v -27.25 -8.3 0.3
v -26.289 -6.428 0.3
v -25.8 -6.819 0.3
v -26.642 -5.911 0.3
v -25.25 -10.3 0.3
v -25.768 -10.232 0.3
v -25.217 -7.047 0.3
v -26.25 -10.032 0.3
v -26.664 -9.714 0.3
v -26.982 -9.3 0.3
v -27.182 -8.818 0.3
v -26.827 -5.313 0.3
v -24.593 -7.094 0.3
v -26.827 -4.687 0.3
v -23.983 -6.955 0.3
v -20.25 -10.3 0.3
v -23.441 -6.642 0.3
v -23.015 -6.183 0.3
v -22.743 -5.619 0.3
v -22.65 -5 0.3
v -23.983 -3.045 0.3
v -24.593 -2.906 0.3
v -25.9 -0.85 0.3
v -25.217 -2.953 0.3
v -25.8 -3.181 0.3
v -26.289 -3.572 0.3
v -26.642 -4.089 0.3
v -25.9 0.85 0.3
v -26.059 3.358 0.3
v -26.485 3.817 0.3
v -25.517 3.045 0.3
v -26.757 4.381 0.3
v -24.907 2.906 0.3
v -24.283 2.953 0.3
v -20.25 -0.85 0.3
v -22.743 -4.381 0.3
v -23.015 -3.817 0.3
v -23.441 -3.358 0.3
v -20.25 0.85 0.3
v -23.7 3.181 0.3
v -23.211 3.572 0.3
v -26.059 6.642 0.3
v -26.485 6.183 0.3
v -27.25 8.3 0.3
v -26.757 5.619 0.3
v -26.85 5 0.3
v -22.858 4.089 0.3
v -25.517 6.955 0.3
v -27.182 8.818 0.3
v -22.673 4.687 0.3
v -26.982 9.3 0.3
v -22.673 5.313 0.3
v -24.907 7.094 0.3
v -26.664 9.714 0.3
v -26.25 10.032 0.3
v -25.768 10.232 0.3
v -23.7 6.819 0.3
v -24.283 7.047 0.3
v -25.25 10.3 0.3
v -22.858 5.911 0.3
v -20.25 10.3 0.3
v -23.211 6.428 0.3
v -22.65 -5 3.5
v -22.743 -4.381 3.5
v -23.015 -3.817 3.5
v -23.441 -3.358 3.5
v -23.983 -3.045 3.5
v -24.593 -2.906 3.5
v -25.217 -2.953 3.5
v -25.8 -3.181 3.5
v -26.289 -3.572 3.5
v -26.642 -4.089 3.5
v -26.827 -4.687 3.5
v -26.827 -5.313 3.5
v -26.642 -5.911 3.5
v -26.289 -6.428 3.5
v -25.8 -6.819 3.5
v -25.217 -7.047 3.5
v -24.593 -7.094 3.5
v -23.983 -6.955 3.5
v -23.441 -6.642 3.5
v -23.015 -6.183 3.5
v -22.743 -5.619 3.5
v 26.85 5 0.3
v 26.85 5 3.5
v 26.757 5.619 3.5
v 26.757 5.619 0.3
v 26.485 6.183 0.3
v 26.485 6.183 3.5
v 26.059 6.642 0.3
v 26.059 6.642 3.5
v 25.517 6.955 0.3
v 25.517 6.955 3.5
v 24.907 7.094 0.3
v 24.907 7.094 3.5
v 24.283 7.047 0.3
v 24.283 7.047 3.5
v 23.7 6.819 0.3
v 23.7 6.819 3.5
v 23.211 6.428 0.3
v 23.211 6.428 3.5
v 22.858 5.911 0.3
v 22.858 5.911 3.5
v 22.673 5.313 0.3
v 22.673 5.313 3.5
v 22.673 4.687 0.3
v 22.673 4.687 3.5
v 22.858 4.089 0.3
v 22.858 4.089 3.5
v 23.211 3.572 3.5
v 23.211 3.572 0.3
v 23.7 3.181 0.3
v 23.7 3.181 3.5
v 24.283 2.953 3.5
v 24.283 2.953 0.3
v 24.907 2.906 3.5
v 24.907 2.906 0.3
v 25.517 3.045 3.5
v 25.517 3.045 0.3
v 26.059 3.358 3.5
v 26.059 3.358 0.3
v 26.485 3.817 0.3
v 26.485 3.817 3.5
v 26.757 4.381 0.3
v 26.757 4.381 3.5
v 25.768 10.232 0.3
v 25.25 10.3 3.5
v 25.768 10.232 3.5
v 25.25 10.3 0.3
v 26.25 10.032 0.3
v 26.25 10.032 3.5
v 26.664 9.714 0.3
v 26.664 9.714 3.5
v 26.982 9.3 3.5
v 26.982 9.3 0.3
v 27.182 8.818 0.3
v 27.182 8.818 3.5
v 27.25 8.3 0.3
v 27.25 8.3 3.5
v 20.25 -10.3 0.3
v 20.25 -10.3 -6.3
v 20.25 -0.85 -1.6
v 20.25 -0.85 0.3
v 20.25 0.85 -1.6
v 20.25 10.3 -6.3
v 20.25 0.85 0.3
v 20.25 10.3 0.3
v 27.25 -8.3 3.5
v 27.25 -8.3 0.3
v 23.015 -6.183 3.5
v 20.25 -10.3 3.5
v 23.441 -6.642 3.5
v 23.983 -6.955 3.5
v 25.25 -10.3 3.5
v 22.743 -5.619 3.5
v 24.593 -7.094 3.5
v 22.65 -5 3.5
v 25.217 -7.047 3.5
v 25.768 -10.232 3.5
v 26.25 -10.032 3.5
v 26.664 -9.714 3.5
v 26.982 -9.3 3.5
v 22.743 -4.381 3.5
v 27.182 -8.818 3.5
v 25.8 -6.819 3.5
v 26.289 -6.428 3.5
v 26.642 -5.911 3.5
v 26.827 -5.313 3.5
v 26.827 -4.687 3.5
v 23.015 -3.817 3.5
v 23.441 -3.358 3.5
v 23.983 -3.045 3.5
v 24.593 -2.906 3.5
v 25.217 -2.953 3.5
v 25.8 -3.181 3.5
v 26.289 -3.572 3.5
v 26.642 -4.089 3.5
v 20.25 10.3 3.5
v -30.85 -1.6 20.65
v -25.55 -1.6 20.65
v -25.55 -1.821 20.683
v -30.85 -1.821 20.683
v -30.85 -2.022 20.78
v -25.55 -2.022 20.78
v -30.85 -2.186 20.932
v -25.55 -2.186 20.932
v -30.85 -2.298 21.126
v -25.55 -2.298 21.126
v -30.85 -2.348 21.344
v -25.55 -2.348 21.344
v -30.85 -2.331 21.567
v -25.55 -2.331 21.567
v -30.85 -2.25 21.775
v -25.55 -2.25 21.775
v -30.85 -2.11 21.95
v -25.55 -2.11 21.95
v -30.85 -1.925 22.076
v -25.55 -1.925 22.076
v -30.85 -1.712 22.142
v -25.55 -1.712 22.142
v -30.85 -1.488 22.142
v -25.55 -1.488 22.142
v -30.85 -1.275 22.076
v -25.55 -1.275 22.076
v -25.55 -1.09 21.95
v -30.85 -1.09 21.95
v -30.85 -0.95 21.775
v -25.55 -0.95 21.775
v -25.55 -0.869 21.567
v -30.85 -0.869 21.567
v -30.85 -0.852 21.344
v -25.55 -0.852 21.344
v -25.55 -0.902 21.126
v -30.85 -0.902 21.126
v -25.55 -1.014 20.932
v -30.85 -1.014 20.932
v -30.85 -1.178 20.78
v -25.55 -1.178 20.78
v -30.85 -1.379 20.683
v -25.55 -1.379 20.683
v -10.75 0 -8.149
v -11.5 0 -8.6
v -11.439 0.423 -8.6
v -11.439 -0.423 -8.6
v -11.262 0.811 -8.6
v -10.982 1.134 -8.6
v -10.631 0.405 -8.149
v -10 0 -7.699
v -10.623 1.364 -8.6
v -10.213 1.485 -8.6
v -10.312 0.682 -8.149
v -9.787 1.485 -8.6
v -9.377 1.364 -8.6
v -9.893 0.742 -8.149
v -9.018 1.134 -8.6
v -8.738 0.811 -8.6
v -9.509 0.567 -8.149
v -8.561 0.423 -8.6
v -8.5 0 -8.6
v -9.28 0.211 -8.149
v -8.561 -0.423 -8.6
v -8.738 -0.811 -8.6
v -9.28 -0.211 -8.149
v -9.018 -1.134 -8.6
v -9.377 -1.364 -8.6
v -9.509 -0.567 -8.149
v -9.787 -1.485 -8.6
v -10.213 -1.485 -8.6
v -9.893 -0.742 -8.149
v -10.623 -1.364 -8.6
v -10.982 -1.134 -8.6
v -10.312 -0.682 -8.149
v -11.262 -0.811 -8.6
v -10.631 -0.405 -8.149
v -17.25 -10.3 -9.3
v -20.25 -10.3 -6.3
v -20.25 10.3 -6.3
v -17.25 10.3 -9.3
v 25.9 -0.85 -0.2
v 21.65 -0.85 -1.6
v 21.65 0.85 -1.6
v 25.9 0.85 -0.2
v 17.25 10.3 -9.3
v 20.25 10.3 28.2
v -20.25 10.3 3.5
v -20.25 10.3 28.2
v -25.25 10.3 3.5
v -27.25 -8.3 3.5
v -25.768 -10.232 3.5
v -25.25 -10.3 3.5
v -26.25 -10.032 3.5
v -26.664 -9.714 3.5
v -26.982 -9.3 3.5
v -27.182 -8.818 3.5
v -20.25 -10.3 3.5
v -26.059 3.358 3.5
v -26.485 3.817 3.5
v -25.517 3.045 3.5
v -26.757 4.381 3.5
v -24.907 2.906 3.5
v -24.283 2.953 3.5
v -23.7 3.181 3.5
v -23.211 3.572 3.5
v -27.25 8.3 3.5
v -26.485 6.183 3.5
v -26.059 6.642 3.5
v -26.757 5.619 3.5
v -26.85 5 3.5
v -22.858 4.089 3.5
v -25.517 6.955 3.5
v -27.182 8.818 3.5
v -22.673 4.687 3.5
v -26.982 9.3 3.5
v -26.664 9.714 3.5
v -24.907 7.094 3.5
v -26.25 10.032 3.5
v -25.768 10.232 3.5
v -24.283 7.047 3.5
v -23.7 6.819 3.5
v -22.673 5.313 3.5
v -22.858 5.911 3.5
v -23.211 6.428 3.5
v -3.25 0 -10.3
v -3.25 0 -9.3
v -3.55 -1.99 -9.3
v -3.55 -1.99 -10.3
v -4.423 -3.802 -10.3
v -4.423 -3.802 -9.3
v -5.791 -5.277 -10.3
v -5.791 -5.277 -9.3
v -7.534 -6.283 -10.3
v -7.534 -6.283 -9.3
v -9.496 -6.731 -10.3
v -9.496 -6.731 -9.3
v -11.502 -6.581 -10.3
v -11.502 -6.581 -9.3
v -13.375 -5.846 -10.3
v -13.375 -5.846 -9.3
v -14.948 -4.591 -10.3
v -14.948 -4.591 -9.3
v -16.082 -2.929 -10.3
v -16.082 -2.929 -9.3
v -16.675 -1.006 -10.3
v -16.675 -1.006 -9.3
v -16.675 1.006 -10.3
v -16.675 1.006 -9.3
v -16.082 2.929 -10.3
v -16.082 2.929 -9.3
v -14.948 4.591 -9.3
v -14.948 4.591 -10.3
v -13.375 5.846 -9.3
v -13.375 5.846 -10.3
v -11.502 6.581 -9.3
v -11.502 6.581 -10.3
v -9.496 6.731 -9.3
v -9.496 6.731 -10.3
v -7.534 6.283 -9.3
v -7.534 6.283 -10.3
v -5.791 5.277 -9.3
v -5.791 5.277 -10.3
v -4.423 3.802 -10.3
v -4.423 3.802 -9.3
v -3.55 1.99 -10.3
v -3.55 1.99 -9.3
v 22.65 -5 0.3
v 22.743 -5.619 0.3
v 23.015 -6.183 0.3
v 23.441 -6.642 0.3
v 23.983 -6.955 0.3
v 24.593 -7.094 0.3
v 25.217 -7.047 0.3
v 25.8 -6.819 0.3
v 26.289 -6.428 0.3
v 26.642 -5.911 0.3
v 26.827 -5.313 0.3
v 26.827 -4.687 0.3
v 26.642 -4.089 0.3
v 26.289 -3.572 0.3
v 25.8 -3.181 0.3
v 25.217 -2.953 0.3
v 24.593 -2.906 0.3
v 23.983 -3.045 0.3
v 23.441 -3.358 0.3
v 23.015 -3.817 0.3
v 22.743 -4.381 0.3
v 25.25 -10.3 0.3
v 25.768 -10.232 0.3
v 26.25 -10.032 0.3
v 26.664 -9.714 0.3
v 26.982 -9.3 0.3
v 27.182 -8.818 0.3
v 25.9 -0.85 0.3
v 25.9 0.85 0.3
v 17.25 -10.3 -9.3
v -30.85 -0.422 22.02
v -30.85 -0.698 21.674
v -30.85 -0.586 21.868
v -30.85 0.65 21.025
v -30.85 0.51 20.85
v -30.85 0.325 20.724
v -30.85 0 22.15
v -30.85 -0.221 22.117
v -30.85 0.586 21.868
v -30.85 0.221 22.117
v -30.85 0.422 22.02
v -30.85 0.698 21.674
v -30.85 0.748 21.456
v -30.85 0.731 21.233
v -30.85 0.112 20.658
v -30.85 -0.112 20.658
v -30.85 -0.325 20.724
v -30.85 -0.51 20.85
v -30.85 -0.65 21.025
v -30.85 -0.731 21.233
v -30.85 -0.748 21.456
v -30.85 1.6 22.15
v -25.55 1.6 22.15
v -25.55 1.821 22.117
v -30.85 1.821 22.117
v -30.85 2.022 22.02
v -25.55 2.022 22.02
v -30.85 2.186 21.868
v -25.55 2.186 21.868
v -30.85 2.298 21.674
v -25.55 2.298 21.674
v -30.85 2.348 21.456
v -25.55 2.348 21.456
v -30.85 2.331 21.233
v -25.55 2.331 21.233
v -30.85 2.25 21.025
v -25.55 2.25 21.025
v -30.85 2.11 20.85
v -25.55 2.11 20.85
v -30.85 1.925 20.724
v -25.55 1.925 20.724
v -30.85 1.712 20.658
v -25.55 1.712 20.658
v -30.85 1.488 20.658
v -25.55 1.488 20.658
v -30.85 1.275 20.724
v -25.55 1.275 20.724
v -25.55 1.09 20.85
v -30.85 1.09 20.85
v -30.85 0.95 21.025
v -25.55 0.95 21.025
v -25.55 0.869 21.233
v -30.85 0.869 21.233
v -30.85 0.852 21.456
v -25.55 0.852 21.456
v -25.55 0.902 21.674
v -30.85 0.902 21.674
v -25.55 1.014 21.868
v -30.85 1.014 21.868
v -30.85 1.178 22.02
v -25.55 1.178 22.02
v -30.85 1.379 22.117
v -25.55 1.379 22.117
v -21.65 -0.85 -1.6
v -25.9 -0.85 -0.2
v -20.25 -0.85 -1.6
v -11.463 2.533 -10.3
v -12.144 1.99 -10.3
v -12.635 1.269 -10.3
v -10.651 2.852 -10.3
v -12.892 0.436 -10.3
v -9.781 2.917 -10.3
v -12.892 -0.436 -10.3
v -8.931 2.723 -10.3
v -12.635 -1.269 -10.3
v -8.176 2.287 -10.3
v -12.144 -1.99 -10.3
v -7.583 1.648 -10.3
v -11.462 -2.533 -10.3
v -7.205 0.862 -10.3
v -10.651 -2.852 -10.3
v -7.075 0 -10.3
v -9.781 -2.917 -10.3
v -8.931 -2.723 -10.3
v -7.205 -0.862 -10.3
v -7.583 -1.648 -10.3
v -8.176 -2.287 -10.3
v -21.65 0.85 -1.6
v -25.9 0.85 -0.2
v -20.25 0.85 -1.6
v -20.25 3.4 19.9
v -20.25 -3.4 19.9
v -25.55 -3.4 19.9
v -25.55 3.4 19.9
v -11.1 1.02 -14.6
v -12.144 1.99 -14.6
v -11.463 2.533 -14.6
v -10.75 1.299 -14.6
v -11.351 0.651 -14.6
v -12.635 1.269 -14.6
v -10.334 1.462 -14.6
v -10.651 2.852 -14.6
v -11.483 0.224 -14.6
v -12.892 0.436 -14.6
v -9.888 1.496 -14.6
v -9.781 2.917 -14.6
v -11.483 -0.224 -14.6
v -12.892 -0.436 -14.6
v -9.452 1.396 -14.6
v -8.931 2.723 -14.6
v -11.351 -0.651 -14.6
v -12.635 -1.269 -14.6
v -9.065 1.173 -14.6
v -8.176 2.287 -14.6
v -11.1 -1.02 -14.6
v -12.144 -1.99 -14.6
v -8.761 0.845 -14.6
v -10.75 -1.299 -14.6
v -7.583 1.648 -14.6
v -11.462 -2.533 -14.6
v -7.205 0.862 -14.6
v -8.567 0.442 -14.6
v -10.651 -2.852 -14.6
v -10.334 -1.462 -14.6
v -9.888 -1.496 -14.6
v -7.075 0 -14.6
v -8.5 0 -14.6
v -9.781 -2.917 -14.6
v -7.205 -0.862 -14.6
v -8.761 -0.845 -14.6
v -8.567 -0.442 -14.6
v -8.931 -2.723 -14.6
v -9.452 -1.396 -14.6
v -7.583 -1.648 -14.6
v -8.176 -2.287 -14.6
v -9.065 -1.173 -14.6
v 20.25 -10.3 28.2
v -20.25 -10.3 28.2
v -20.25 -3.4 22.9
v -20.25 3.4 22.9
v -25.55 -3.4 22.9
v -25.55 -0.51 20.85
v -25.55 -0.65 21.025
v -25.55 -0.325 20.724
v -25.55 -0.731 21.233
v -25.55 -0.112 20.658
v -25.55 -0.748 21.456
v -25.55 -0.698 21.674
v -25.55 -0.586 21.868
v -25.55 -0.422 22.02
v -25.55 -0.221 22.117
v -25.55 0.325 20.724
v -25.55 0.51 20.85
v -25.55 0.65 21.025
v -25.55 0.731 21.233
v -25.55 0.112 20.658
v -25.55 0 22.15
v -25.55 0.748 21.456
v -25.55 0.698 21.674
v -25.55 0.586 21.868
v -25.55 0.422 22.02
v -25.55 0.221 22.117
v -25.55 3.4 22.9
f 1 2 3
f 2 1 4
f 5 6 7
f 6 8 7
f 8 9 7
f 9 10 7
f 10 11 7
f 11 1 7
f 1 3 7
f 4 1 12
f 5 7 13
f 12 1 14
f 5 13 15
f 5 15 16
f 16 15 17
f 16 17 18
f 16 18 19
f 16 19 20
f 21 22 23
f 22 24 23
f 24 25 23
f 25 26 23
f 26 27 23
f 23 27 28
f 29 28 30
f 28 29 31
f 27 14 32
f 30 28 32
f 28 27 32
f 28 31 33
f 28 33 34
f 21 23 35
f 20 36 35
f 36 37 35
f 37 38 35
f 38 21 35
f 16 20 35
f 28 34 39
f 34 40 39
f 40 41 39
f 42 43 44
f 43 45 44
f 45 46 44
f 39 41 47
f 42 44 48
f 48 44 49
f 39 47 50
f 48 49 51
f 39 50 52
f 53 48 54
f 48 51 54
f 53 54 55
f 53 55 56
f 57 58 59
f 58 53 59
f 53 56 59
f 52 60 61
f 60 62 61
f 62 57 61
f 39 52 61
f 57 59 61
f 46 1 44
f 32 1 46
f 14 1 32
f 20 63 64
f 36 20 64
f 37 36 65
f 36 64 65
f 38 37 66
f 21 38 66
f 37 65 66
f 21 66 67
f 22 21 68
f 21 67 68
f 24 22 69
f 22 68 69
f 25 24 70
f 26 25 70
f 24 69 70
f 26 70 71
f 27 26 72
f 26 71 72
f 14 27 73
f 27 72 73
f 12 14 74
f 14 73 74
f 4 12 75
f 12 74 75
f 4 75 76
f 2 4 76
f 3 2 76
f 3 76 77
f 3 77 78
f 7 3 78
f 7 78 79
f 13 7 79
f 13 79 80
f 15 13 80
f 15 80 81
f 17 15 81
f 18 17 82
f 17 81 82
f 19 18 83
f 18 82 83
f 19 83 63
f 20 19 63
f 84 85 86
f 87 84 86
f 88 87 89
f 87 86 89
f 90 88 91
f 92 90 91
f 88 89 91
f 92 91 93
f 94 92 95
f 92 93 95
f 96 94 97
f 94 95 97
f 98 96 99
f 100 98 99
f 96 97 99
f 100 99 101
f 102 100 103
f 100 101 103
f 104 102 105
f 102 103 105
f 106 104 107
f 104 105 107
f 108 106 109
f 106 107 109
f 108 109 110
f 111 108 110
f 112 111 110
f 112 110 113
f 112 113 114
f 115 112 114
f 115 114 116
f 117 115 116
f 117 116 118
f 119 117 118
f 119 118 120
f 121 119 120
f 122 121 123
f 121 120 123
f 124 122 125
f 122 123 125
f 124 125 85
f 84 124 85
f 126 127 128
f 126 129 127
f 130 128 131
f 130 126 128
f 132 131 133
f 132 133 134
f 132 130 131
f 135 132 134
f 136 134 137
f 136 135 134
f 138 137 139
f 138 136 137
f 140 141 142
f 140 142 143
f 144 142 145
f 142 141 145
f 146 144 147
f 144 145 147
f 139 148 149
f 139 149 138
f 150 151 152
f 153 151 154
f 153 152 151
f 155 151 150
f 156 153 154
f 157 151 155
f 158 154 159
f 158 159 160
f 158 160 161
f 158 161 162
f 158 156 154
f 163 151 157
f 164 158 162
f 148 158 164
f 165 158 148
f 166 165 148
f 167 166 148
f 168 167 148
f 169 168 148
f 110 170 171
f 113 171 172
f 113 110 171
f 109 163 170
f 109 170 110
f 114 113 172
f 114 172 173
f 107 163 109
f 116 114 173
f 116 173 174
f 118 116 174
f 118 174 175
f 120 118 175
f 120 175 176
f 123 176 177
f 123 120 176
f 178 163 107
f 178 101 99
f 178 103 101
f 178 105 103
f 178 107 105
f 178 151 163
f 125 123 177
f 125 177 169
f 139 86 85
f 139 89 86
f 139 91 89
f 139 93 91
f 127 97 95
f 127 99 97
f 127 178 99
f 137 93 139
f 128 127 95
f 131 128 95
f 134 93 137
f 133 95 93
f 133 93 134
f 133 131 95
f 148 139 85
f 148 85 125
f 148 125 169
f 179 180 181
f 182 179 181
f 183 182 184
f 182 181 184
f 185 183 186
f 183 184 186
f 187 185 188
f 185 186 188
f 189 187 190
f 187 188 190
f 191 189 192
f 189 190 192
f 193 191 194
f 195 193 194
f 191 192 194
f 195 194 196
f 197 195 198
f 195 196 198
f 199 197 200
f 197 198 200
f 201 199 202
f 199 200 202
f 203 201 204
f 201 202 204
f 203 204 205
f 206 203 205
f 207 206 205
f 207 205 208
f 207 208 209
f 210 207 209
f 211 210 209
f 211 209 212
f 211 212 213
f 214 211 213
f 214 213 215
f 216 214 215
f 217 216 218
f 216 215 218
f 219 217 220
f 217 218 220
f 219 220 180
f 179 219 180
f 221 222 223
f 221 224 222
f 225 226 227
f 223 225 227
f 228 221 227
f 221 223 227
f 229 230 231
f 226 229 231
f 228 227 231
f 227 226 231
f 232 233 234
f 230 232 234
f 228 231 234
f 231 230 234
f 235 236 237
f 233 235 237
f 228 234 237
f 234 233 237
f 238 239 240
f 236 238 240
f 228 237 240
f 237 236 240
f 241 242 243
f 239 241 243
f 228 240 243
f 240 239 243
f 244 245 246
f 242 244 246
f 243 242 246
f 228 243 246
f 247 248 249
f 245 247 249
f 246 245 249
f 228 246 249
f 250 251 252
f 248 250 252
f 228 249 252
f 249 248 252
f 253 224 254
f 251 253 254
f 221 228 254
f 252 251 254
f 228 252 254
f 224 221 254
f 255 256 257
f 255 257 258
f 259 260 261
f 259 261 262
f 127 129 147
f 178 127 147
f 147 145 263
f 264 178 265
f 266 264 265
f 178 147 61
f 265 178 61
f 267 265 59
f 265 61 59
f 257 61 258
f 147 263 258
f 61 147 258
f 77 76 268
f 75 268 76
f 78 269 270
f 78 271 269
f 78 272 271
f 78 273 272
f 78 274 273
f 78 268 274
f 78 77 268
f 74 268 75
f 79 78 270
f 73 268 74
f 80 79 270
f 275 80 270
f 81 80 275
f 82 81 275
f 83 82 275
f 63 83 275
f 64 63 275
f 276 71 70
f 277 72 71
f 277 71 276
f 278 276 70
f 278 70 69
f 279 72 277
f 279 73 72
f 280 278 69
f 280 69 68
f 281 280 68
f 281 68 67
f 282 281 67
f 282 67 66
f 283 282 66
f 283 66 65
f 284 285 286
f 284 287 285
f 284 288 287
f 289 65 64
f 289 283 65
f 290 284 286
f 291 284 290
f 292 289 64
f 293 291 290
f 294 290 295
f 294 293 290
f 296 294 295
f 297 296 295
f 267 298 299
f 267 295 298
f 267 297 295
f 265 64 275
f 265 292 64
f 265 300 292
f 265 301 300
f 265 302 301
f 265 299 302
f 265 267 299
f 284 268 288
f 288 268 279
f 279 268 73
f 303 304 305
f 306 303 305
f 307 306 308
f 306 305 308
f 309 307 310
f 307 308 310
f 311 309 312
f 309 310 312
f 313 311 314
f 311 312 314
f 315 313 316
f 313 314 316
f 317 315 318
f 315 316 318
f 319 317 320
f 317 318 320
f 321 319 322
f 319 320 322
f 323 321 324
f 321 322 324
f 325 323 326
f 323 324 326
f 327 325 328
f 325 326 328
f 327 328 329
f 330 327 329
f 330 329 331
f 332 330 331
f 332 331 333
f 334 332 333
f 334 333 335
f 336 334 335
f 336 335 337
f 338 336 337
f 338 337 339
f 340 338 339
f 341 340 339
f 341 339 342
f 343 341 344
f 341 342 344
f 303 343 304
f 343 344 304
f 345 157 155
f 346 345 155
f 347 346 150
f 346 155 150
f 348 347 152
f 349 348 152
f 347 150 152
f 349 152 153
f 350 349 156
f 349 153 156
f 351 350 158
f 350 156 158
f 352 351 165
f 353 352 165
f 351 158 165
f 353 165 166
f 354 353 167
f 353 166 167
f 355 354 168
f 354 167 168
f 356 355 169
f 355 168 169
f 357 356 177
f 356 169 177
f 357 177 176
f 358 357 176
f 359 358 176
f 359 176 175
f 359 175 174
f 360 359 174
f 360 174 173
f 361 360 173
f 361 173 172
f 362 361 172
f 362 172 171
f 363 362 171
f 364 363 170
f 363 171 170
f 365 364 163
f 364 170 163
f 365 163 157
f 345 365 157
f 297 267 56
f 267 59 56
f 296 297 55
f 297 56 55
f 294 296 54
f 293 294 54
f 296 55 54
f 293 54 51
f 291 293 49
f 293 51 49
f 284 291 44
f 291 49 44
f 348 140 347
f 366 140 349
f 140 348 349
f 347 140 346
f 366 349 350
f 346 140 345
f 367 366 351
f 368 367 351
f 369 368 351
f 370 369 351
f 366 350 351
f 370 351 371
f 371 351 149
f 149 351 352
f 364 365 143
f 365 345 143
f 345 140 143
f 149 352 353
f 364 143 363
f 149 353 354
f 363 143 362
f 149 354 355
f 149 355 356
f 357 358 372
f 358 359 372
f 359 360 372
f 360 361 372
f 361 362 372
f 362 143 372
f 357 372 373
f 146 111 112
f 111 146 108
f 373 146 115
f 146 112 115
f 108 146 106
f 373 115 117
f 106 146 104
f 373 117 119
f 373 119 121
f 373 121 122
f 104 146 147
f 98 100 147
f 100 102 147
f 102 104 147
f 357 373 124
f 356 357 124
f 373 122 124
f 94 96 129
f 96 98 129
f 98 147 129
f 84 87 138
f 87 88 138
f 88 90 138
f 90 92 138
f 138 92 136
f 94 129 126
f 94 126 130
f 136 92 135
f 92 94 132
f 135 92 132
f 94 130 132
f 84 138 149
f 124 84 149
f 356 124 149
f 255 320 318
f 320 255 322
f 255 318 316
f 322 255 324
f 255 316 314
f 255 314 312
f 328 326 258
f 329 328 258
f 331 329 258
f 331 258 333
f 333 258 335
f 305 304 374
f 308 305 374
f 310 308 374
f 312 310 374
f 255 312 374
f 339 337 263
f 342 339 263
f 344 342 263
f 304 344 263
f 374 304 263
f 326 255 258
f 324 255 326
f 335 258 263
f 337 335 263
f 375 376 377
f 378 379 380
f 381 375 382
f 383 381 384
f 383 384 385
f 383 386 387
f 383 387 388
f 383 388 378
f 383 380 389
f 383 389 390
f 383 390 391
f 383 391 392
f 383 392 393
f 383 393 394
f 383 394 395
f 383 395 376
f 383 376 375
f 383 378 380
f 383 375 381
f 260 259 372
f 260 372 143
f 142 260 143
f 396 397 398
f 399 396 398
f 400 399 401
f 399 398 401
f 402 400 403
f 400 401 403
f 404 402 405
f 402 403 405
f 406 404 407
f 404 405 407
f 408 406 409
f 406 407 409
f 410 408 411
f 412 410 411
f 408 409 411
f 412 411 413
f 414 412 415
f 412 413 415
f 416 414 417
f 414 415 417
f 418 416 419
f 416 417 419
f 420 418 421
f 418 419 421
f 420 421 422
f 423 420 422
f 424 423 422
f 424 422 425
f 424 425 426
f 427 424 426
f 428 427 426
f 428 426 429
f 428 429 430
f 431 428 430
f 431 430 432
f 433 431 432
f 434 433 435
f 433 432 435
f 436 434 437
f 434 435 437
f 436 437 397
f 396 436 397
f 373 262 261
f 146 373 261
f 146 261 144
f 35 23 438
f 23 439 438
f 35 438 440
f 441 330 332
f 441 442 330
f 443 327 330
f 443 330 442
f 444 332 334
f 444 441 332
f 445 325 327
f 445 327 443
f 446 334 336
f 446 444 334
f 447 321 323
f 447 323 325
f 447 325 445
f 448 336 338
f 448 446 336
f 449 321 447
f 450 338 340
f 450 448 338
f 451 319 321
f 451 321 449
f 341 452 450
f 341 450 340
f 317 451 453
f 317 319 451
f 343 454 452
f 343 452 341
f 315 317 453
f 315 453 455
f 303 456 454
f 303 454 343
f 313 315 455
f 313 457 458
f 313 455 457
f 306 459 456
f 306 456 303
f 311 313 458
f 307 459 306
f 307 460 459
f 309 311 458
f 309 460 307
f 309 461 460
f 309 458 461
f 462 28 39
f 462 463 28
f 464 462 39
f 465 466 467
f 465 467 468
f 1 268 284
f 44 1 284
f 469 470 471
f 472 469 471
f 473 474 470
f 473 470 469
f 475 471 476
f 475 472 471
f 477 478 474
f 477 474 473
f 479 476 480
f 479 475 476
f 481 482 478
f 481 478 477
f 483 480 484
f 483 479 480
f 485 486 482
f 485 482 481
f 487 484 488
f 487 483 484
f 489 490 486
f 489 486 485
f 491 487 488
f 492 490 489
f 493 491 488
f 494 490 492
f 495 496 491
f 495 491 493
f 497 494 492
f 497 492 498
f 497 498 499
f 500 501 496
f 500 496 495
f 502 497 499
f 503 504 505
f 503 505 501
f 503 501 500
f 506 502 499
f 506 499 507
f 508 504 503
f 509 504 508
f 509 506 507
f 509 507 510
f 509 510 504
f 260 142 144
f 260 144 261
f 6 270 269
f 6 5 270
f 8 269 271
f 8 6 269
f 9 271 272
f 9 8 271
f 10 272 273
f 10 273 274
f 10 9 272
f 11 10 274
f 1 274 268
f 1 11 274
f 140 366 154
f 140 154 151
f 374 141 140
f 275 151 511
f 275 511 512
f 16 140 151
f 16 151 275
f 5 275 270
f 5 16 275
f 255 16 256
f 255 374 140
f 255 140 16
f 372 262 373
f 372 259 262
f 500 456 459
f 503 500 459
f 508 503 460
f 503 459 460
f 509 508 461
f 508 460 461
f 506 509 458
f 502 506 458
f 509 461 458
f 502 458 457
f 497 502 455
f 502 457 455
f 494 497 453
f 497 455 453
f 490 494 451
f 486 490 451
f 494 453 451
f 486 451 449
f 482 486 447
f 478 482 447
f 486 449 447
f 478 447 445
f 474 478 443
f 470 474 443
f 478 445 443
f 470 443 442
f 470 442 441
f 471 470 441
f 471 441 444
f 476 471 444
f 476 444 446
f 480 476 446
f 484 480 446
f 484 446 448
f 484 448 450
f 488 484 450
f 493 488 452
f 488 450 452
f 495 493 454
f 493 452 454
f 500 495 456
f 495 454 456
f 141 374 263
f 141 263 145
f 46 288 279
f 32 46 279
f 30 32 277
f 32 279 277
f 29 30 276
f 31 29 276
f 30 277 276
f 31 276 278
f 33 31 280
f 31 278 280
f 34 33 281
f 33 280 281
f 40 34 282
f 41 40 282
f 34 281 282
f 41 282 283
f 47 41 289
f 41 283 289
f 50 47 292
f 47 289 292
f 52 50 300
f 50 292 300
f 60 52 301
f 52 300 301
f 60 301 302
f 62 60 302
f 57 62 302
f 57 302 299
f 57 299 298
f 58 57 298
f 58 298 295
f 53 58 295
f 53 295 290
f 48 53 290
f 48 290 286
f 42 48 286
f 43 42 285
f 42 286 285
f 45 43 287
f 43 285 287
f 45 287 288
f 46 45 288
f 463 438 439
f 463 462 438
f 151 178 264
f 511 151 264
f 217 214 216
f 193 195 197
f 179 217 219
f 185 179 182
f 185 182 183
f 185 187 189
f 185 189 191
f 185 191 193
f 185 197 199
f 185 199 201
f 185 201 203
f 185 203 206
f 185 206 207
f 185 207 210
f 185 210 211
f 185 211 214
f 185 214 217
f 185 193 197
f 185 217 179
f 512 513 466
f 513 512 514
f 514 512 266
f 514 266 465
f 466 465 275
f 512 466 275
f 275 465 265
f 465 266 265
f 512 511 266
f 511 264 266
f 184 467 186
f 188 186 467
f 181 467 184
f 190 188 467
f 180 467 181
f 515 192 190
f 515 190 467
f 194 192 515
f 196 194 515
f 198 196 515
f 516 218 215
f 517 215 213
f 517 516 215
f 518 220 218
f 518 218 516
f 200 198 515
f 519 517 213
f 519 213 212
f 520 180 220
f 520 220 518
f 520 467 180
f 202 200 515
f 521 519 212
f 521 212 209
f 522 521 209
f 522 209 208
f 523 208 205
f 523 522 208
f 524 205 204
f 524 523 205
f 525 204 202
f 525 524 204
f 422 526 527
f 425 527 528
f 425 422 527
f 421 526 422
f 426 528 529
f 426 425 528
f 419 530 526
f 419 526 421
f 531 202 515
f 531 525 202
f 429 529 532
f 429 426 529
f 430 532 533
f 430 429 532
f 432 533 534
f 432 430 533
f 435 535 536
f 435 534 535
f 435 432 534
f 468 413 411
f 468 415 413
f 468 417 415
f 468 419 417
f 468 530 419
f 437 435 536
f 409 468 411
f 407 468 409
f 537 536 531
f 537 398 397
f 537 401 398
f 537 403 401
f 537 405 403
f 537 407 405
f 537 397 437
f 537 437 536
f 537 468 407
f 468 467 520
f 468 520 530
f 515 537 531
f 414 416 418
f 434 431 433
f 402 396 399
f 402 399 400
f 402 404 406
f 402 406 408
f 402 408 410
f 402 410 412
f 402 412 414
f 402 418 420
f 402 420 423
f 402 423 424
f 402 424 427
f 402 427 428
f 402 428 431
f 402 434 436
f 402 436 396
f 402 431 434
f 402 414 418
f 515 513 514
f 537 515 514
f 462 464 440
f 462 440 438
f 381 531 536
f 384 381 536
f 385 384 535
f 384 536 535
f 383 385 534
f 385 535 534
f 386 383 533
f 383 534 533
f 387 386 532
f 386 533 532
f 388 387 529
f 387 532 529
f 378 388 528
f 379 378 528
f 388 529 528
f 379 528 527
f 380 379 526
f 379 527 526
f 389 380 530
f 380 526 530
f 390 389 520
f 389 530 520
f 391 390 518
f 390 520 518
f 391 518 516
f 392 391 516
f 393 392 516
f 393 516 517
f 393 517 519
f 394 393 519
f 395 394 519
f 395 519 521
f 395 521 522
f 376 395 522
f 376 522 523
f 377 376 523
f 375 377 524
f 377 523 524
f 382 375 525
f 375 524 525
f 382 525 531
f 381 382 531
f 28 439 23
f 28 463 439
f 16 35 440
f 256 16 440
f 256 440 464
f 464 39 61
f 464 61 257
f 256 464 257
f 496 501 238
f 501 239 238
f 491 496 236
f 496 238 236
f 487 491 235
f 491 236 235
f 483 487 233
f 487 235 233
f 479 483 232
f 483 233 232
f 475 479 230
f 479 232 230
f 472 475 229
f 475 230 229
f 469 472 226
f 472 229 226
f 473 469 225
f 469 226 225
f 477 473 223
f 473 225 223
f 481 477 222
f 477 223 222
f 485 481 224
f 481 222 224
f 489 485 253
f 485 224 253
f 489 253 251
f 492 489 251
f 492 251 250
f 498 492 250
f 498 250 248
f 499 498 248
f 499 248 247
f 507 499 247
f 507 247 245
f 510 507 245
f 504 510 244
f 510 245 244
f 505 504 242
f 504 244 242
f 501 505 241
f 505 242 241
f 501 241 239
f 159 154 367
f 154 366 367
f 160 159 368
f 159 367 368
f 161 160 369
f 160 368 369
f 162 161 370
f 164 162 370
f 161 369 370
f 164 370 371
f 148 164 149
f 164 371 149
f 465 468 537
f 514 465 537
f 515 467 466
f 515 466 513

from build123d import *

# Parameters (mm, degrees)
BOSS_EXTRU_1_DEPTH                = 10.3
ESQUISSE3_W                       = 7
ESQUISSE3_H                       = 20.6
ESQUISSE3_R                       = 2.1
BOSS_EXTRU_2_DEPTH                = 3.2
BOSS_EXTRU_3_DEPTH                = 0.85
ESQUISSE8_R                       = 6.75
BOSS_EXTRU_7_DEPTH                = 1
ESQUISSE5_R                       = 2.925
BOSS_EXTRU_4_DEPTH                = 4.3
CONG_1_R                          = 2
ESQUISSE6_W                       = 3
ESQUISSE6_H                       = 6.8
BOSS_EXTRU_5_DEPTH                = 5.3
ESQUISSE7_R                       = 0.75
BOSS_EXTRU_6_DEPTH                = 5.3
DIAM_TRE_DU_PER_AGE_3_0_3_1_D     = 3
DIAM_TRE_DU_PER_AGE_3_0_3_1_DEPTH = 6
DIAM_TRE_DU_PER_AGE_3_0_3_1_TIP   = 0.901290929


with BuildPart() as part:
    # Esquisse1 → Boss.-Extru.1 (new, symmetric)
    with BuildSketch(Plane(origin=(0, 0, 0), x_dir=(1, 0, 0), z_dir=(0, 1, 0))):
        Polygon((-17.25, 9.3), (17.25, 9.3), (20.25, 6.3), (20.25, -28.2), (-20.25, -28.2), (-20.25, 6.3), align=None)
    extrude(amount=BOSS_EXTRU_1_DEPTH, both=True)

    # Esquisse3 → Boss.-Extru.2 (add)
    # profile 1 of 2: a face of its own
    with BuildSketch(Plane.XY.offset(3.5)):
        with Locations((23.75, 0)):
            Rectangle(ESQUISSE3_W, ESQUISSE3_H)
        with Locations((24.75, 5)):
            Circle(ESQUISSE3_R, mode=Mode.SUBTRACT)
        with Locations(Location((24.75, -5, 0), (0, 0, 180))):
            Circle(ESQUISSE3_R, mode=Mode.SUBTRACT)
    # profile 2 of 2: a face of its own
    with BuildSketch(Plane.XY.offset(3.5)):
        with Locations((-23.75, 0)):
            Rectangle(ESQUISSE3_W, ESQUISSE3_H)
        with Locations(Location((-24.75, 5, 0), (0, 0, 180))):
            Circle(ESQUISSE3_R, mode=Mode.SUBTRACT)
        with Locations((-24.75, -5)):
            Circle(ESQUISSE3_R, mode=Mode.SUBTRACT)
    extrude(amount=-BOSS_EXTRU_2_DEPTH)

    # Esquisse4 → Boss.-Extru.3 (add, symmetric)
    with BuildSketch(Plane(origin=(0, 0, 0), x_dir=(1, 0, 0), z_dir=(0, 1, 0))):
        Polygon((20.25, -0.3), (20.25, 1.6), (21.65, 1.6), (25.9, 0.2), (25.9, -0.3), align=None)
        Polygon((-25.9, -0.3), (-20.25, -0.3), (-20.25, 1.6), (-21.65, 1.6), (-25.9, 0.2), align=None)
    extrude(amount=BOSS_EXTRU_3_DEPTH, both=True)

    # Esquisse8 → Boss.-Extru.7 (add)
    with BuildSketch(Plane(origin=(0, 0, -9.3), x_dir=(-1, 0, 0), z_dir=(0, 0, -1))):
        with Locations(Location((10, 0, 0), (0, 0, 180))):
            Circle(ESQUISSE8_R)
    extrude(amount=BOSS_EXTRU_7_DEPTH)

    # Esquisse5 → Boss.-Extru.4 (add)
    with BuildSketch(Plane(origin=(0, 0, -10.3), x_dir=(-1, 0, 0), z_dir=(0, 0, -1))):
        with Locations(Location((10, 0, 0), (0, 0, 180))):
            Circle(ESQUISSE5_R)
    extrude(amount=BOSS_EXTRU_4_DEPTH)

    # Congé1
    cong_1_edges = [part.edges().sort_by_distance(p)[0] for p in [
        (27.25, 10.3, 1.9),
        (27.25, -10.3, 1.9),
        (-27.25, -10.3, 1.9),
        (-27.25, 10.3, 1.9),
    ]]
    fillet(cong_1_edges, radius=CONG_1_R)

    # Esquisse6 → Boss.-Extru.5 (add)
    with BuildSketch(Plane.ZY.offset(20.25)):
        with Locations((21.4, 0)):
            Rectangle(ESQUISSE6_W, ESQUISSE6_H)
    extrude(amount=BOSS_EXTRU_5_DEPTH)

    # Esquisse7 → Boss.-Extru.6 (add)
    with BuildSketch(Plane.ZY.offset(25.55)):
        with Locations((21.4, 0)):
            Circle(ESQUISSE7_R)
        with Locations((21.4, 1.6)):
            Circle(ESQUISSE7_R)
        with Locations(Location((21.4, -1.6, 0), (0, 0, 180))):
            Circle(ESQUISSE7_R)
    extrude(amount=BOSS_EXTRU_6_DEPTH)

    # Diamètre du perçage Ø3.0 (3)1
    with Locations(Plane(origin=(0, 0, -14.6), x_dir=(-1, 0, 0), z_dir=(0, 0, -1))):
        with Locations((10, 0)):
            Hole(DIAM_TRE_DU_PER_AGE_3_0_3_1_D / 2, depth=DIAM_TRE_DU_PER_AGE_3_0_3_1_DEPTH)
            with Locations((0, 0, -(DIAM_TRE_DU_PER_AGE_3_0_3_1_DEPTH + DIAM_TRE_DU_PER_AGE_3_0_3_1_TIP / 2))):  # 118° drill point
                Cone(0, DIAM_TRE_DU_PER_AGE_3_0_3_1_D / 2, DIAM_TRE_DU_PER_AGE_3_0_3_1_TIP, mode=Mode.SUBTRACT)


solid = part.part
